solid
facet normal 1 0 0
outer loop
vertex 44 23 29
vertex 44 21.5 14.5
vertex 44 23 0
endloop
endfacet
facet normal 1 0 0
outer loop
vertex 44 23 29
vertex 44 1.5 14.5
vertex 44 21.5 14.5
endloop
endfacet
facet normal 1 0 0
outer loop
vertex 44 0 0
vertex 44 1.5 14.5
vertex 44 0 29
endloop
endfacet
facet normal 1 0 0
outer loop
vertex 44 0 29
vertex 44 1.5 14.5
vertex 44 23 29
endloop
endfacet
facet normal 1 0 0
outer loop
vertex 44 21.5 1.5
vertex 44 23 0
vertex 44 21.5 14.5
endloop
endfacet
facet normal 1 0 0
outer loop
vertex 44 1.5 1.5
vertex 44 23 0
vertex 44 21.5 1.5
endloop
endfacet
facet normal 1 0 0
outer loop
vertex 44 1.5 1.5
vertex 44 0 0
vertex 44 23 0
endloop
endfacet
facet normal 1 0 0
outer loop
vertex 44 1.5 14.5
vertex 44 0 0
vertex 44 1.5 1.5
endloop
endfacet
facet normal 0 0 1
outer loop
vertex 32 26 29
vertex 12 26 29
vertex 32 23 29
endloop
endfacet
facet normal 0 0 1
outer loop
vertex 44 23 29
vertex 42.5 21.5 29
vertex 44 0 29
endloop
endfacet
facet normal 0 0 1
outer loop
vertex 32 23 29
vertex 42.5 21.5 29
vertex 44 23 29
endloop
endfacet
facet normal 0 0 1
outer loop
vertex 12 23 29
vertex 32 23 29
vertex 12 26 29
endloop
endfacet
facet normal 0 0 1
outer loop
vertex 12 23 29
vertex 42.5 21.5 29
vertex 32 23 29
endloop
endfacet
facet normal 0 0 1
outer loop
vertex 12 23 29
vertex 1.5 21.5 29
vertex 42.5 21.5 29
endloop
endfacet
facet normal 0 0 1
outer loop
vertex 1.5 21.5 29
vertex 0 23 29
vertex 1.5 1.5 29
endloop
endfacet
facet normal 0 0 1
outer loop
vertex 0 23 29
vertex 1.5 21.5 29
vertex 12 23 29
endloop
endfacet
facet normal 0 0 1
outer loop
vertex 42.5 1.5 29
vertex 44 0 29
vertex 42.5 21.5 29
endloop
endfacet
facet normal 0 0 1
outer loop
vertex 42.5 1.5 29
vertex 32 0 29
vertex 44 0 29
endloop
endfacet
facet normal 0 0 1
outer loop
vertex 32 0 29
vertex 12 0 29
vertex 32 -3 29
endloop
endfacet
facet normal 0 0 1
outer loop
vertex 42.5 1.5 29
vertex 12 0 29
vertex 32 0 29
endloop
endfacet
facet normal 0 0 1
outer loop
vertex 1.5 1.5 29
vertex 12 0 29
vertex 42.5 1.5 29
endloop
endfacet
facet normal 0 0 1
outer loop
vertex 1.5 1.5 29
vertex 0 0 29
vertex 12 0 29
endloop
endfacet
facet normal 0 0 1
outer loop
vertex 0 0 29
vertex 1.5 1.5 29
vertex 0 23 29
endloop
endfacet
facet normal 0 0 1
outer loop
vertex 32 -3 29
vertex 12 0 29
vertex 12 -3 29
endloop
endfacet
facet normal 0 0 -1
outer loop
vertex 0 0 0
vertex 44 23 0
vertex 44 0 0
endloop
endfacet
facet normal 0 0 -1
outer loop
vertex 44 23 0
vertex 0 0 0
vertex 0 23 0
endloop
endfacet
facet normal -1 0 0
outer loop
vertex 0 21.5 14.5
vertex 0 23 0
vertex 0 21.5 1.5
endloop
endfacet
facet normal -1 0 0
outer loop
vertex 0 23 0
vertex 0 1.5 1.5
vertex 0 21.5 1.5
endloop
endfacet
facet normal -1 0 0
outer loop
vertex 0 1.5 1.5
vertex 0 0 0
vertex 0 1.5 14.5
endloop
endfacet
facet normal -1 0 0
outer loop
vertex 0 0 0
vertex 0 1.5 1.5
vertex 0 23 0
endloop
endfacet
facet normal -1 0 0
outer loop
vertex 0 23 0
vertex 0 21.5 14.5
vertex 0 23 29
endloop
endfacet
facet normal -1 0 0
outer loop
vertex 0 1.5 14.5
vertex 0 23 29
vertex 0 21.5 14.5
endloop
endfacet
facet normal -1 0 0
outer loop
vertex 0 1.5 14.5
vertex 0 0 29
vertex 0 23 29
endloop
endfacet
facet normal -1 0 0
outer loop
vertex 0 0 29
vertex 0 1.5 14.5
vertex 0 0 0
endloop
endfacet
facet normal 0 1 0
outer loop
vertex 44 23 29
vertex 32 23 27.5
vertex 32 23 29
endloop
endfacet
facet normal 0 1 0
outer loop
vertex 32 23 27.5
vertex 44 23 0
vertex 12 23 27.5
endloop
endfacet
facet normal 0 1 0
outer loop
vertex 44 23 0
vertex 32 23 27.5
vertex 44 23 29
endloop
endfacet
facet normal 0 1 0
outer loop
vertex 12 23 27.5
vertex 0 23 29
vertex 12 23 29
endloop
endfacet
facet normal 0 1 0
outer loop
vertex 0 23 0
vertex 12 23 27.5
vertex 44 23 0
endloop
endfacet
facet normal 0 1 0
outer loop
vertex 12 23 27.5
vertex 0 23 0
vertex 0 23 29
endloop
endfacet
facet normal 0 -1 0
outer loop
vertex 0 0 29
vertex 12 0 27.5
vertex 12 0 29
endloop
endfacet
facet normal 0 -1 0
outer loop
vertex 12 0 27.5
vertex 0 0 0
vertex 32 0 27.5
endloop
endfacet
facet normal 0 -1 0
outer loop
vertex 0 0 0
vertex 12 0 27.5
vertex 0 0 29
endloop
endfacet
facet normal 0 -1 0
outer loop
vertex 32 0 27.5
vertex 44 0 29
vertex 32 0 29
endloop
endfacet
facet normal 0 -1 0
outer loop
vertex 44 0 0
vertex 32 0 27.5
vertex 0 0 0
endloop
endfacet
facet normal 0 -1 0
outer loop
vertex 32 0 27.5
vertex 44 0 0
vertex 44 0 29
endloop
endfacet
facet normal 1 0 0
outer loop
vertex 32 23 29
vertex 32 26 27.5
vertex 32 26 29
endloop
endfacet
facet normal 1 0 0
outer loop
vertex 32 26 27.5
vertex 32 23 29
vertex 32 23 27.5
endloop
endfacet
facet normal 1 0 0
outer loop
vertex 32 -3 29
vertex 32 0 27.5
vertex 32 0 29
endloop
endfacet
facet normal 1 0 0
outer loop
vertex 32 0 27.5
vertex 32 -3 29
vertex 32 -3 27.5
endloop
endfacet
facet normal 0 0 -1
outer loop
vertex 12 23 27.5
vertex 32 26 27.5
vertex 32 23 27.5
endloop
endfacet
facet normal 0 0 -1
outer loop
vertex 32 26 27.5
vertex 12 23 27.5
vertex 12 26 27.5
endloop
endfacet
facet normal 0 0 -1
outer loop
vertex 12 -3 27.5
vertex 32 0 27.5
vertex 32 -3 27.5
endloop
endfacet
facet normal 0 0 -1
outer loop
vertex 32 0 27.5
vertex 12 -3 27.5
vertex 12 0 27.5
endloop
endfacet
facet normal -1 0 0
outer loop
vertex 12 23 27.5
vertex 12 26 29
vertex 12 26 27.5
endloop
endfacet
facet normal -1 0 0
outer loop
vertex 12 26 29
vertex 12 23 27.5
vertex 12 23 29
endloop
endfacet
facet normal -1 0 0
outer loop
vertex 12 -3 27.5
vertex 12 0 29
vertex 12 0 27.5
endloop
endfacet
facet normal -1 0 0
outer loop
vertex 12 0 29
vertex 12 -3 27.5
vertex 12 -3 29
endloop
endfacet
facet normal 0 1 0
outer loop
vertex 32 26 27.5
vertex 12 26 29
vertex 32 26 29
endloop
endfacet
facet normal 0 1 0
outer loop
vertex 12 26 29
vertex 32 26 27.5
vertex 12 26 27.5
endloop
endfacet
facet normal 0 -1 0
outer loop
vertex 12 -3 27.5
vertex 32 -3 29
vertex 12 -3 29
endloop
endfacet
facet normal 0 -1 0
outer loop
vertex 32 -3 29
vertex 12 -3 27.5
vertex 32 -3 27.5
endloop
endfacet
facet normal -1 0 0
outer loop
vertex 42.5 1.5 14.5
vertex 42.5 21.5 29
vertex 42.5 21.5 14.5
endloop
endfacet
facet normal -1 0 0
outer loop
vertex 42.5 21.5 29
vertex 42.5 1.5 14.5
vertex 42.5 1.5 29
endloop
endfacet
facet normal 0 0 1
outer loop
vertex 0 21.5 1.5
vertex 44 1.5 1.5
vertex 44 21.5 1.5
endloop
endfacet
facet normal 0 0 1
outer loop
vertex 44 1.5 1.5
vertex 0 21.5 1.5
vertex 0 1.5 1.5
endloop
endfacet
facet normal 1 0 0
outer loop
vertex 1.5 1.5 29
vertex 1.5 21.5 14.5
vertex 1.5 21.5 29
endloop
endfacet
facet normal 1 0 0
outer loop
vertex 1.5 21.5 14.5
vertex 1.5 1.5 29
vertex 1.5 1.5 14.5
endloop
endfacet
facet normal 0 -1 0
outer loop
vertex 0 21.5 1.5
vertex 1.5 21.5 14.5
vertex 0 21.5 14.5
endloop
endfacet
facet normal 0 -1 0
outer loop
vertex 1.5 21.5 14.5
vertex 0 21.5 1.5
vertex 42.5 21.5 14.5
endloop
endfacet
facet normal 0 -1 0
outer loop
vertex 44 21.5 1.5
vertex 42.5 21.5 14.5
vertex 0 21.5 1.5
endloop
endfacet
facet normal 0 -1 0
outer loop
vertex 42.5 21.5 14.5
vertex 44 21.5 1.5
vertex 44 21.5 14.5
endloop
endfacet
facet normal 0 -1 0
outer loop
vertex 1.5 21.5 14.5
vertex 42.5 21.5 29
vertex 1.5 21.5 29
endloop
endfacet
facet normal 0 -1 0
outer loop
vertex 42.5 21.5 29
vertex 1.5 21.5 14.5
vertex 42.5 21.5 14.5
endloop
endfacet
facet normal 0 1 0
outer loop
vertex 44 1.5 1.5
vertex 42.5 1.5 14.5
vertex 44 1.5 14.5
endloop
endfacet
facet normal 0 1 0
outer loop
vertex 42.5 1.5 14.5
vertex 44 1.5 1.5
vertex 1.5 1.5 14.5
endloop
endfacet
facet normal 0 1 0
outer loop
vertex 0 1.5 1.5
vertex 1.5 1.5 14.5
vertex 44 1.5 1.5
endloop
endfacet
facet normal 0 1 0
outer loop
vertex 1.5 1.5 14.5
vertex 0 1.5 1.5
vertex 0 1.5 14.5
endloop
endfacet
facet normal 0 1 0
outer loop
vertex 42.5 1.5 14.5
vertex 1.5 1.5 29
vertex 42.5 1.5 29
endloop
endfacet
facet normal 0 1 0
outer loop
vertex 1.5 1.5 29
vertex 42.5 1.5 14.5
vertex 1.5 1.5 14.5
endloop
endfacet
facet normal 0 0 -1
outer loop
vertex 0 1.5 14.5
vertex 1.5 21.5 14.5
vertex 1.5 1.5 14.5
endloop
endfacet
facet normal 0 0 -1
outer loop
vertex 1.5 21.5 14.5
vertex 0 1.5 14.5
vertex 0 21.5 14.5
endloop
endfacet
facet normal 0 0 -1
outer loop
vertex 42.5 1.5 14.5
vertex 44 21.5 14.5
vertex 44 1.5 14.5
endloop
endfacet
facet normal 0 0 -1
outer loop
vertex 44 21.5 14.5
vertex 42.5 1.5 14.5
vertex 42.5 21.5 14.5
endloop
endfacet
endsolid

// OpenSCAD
module cage(tick, B, D, F, objectLen) {
    // Inside is equal to size plus tick
    B=B+tick*2;
    D=D+tick*2;
    F=F+tick*2;
    holderSpace = (objectLen - B)/2;
	difference() {
		union() {
			cube([B,D,F]);
            // For conecting grippers
            translate([-holderSpace,-tick*2,F-tick]) cube([B+(holderSpace*2),D+(tick*4),tick]);
		}
        // Z
		translate([tick,tick,tick]) cube([B-(tick*2),D-(tick*2),F]);
        // X
		translate([-1,tick,tick]) cube([B+2,D-(tick*2),F/2-tick]);
        //translate([B/2,0,D/2]) rotate([-90,0,0]) cylinder(r=B/2,h=D, $fn=45);
        // Y
		translate([tick,tick,tick]) cube([B-(tick*2),D-(tick*2),F-(tick*2)]);
	}
   
}



module gripper(tick, A, D, F, objectLen) {
    
    // Basic Info
    gearSpace = A - F;
    gripperLen = objectLen;
    
    // Starts and Lengths
    extraSpaceStart = gripperLen + tick;
    extraSpaceLen = gearSpace + gearSpace/4.0;
    holdersStart = extraSpaceStart+extraSpaceLen+tick;
    holdersLen = tick+0.5;
    TotalLen = holdersStart + holdersLen + tick;
    
    // Width and heigth
    heigth = tick*4;
    width = D + (tick*6);
    
    // A small hole
    holeStart = extraSpaceStart +  gearSpace/2;
    
	difference() {
		cube([TotalLen,width,heigth]);
		translate([extraSpaceStart,tick,-0.1]) cube([extraSpaceLen,width- (tick*2),heigth+1]);
        translate([extraSpaceStart,tick*2,-0.1]) cube([TotalLen-extraSpaceStart+ 0.1,width-(tick*4),heigth+1]);
        translate([holdersStart,tick,-0.1]) cube([holdersLen, width-(tick*2), heigth+1]);
        translate([-0.1,-0.1,-0.1]) cube([gripperLen, width/3+(0.1), heigth+1]);
		translate([-0.1,width-(width/3)+(0.1),-0.1]) cube([gripperLen, width/3, heigth+1]);
        
        // A small hole
		translate([holeStart,-0.1,heigth/2]) cube([tick,tick+0.2,tick]);
		//translate([23.5,-0.1,2]) cube([3.9,2.5,4.4]);
	}

}


cage(1.5, 41, 20, 26, 20);
*gripper(1.5, 25, 10, 12, 10);
